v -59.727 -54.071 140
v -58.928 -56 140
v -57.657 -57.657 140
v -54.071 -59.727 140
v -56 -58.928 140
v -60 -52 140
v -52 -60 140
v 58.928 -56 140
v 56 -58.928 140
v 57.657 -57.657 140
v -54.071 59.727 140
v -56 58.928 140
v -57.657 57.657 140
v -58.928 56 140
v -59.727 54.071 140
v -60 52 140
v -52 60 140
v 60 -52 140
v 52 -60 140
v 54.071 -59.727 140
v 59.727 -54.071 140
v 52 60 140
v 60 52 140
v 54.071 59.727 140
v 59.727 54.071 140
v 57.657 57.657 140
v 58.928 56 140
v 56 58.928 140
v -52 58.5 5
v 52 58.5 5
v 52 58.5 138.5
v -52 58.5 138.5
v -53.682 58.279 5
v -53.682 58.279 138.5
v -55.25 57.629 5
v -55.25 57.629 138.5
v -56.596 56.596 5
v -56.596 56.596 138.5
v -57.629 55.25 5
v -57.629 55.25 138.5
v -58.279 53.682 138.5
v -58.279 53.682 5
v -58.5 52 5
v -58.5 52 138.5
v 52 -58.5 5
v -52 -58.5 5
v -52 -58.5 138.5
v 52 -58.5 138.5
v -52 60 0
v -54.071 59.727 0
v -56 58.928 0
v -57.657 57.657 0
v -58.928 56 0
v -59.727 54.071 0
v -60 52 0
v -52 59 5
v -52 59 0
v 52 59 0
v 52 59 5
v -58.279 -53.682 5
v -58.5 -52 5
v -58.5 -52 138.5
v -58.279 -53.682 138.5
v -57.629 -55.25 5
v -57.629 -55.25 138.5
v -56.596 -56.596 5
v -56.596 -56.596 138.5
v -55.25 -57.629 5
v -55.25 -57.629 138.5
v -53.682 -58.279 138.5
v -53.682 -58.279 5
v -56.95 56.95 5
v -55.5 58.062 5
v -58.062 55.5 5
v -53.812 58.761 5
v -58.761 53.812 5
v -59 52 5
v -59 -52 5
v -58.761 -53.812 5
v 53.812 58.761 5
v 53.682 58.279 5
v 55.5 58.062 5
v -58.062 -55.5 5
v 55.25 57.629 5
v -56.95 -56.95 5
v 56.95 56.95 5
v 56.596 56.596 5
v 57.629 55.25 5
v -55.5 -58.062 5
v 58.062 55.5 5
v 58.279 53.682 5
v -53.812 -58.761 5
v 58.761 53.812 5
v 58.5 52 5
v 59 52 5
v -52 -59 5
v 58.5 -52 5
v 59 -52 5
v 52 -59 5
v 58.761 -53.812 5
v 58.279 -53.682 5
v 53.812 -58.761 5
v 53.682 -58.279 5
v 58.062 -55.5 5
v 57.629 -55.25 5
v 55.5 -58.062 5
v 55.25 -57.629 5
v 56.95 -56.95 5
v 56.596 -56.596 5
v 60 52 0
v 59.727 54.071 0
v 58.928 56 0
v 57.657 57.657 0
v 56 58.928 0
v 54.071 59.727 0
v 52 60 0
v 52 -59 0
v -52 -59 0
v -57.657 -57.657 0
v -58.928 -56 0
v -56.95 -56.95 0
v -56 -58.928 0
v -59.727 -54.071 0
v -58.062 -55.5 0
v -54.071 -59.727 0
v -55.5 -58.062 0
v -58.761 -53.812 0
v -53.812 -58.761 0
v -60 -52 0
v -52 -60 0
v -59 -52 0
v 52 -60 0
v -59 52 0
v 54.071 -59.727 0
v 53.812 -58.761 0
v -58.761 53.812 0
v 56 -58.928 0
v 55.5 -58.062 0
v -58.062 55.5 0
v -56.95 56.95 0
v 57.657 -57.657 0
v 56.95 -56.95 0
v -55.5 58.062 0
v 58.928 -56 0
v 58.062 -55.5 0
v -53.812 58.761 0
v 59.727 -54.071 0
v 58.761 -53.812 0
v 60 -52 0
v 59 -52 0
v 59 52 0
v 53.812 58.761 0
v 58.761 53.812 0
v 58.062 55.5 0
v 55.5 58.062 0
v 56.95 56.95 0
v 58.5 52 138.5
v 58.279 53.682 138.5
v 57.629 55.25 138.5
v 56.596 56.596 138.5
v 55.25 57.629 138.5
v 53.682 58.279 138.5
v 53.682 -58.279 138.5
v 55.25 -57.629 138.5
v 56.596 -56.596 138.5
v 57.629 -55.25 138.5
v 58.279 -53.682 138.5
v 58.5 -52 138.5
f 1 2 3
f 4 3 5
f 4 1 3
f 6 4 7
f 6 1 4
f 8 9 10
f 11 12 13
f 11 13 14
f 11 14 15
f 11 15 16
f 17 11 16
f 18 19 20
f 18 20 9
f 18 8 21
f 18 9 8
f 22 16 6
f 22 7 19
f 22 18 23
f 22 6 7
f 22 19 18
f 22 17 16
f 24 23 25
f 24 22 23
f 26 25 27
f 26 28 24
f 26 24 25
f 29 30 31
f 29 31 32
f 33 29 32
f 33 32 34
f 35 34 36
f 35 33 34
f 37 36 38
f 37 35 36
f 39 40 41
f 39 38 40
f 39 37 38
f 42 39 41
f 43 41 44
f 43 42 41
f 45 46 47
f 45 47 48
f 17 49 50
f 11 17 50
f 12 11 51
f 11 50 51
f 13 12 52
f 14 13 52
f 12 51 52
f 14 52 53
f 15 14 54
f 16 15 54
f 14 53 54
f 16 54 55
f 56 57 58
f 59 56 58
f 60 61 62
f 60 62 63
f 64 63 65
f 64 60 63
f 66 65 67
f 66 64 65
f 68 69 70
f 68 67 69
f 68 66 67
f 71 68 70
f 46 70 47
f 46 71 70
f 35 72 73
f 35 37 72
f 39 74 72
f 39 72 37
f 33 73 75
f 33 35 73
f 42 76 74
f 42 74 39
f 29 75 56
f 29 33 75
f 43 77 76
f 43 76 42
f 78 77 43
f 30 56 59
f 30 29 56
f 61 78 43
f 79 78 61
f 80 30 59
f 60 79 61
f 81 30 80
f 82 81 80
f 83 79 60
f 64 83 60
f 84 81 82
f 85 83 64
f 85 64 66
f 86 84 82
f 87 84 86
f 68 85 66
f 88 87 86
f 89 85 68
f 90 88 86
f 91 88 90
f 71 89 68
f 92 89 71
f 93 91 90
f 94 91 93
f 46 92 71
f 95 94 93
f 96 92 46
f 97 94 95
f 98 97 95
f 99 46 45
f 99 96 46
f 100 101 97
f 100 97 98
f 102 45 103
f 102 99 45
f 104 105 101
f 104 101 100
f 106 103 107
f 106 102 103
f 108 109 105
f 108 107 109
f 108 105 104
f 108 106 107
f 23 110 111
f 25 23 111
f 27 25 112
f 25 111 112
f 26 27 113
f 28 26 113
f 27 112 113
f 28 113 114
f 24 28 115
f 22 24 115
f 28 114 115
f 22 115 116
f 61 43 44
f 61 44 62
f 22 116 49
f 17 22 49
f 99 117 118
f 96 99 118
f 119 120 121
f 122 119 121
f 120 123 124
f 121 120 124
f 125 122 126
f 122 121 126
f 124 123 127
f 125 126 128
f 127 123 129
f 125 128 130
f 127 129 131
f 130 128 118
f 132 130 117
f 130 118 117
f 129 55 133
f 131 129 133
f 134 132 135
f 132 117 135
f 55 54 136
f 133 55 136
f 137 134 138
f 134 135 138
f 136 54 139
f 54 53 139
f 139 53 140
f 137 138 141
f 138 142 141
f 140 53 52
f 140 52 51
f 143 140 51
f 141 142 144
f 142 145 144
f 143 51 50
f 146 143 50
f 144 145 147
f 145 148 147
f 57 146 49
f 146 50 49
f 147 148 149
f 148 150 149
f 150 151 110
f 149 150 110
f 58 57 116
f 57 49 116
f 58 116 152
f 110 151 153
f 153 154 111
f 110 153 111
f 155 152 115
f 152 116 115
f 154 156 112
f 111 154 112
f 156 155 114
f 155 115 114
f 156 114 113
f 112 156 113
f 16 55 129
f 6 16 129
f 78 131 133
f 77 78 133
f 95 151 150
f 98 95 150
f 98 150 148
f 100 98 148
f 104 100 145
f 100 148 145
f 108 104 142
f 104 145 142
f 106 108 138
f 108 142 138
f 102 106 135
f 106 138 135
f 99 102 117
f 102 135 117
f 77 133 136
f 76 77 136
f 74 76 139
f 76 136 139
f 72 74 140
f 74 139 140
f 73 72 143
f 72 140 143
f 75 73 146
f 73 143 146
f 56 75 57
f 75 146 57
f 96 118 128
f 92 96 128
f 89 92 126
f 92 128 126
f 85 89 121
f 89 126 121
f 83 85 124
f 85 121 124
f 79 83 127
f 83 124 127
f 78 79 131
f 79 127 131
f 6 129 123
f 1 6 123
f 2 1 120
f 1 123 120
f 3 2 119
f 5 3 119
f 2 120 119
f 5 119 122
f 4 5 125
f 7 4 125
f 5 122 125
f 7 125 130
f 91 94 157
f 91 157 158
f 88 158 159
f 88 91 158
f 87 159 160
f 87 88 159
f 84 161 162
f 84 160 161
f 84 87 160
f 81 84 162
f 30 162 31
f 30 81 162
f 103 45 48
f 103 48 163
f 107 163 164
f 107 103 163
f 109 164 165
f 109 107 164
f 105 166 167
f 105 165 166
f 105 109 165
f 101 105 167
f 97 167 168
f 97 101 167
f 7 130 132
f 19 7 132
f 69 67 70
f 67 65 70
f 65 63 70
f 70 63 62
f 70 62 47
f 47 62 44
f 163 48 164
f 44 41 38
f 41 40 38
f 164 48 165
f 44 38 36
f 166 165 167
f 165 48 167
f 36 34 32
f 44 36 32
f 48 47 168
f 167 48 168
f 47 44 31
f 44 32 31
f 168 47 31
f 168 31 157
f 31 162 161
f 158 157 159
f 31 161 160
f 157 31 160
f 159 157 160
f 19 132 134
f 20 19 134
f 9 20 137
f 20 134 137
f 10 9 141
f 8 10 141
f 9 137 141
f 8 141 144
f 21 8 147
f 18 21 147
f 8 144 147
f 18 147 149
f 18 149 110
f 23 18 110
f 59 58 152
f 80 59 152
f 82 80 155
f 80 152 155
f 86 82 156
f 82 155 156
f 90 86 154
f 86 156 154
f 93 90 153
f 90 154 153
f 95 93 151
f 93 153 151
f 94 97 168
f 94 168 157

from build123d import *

# Parameters (mm, degrees)
PAD016_DEPTH    = 140
THICKNESS003_T  = -1.5
POCKET018_DEPTH = 5


with BuildPart() as part:
    # Sketch035 → Pad016 (new body)
    with BuildSketch(Plane.XY):
        with BuildLine():
            Line((-60, 52), (-60, -52))
            ThreePointArc((-60, -52), (-57.6568542495, -57.6568542495), (-52, -60))
            Line((-52, -60), (52, -60))
            ThreePointArc((52, -60), (57.6568542495, -57.6568542495), (60, -52))
            Line((60, -52), (60, 52))
            ThreePointArc((60, 52), (57.6568542495, 57.6568542495), (52, 60))
            Line((52, 60), (-52, 60))
            ThreePointArc((-52, 60), (-57.6568542495, 57.6568542495), (-60, 52))
        make_face()
    extrude(amount=PAD016_DEPTH)

    # Thickness003
    thickness003_openings = [part.faces().sort_by_distance(p)[0] for p in [
        (0, 0, 0),
    ]]
    offset(amount=THICKNESS003_T, openings=thickness003_openings)

    # Sketch046 (on Face10 of Thickness003) → Pocket018 (cut)
    with BuildSketch(Plane(origin=(0, 0, 0), x_dir=(1, 0, 0), z_dir=(0, 0, -1))):
        with BuildLine():
            Line((-52, -59), (52, -59))
            ThreePointArc((52, -59), (56.9497474683, -56.9497474683), (59, -52))
            Line((59, -52), (59, 52))
            ThreePointArc((59, 52), (56.9497474683, 56.9497474683), (52, 59))
            Line((52, 59), (-52, 59))
            ThreePointArc((-52, 59), (-56.9497474683, 56.9497474683), (-59, 52))
            Line((-59, 52), (-59, -52))
            ThreePointArc((-59, -52), (-56.9497474683, -56.9497474683), (-52, -59))
        make_face()
    extrude(amount=-POCKET018_DEPTH, mode=Mode.SUBTRACT)


solid = part.part
